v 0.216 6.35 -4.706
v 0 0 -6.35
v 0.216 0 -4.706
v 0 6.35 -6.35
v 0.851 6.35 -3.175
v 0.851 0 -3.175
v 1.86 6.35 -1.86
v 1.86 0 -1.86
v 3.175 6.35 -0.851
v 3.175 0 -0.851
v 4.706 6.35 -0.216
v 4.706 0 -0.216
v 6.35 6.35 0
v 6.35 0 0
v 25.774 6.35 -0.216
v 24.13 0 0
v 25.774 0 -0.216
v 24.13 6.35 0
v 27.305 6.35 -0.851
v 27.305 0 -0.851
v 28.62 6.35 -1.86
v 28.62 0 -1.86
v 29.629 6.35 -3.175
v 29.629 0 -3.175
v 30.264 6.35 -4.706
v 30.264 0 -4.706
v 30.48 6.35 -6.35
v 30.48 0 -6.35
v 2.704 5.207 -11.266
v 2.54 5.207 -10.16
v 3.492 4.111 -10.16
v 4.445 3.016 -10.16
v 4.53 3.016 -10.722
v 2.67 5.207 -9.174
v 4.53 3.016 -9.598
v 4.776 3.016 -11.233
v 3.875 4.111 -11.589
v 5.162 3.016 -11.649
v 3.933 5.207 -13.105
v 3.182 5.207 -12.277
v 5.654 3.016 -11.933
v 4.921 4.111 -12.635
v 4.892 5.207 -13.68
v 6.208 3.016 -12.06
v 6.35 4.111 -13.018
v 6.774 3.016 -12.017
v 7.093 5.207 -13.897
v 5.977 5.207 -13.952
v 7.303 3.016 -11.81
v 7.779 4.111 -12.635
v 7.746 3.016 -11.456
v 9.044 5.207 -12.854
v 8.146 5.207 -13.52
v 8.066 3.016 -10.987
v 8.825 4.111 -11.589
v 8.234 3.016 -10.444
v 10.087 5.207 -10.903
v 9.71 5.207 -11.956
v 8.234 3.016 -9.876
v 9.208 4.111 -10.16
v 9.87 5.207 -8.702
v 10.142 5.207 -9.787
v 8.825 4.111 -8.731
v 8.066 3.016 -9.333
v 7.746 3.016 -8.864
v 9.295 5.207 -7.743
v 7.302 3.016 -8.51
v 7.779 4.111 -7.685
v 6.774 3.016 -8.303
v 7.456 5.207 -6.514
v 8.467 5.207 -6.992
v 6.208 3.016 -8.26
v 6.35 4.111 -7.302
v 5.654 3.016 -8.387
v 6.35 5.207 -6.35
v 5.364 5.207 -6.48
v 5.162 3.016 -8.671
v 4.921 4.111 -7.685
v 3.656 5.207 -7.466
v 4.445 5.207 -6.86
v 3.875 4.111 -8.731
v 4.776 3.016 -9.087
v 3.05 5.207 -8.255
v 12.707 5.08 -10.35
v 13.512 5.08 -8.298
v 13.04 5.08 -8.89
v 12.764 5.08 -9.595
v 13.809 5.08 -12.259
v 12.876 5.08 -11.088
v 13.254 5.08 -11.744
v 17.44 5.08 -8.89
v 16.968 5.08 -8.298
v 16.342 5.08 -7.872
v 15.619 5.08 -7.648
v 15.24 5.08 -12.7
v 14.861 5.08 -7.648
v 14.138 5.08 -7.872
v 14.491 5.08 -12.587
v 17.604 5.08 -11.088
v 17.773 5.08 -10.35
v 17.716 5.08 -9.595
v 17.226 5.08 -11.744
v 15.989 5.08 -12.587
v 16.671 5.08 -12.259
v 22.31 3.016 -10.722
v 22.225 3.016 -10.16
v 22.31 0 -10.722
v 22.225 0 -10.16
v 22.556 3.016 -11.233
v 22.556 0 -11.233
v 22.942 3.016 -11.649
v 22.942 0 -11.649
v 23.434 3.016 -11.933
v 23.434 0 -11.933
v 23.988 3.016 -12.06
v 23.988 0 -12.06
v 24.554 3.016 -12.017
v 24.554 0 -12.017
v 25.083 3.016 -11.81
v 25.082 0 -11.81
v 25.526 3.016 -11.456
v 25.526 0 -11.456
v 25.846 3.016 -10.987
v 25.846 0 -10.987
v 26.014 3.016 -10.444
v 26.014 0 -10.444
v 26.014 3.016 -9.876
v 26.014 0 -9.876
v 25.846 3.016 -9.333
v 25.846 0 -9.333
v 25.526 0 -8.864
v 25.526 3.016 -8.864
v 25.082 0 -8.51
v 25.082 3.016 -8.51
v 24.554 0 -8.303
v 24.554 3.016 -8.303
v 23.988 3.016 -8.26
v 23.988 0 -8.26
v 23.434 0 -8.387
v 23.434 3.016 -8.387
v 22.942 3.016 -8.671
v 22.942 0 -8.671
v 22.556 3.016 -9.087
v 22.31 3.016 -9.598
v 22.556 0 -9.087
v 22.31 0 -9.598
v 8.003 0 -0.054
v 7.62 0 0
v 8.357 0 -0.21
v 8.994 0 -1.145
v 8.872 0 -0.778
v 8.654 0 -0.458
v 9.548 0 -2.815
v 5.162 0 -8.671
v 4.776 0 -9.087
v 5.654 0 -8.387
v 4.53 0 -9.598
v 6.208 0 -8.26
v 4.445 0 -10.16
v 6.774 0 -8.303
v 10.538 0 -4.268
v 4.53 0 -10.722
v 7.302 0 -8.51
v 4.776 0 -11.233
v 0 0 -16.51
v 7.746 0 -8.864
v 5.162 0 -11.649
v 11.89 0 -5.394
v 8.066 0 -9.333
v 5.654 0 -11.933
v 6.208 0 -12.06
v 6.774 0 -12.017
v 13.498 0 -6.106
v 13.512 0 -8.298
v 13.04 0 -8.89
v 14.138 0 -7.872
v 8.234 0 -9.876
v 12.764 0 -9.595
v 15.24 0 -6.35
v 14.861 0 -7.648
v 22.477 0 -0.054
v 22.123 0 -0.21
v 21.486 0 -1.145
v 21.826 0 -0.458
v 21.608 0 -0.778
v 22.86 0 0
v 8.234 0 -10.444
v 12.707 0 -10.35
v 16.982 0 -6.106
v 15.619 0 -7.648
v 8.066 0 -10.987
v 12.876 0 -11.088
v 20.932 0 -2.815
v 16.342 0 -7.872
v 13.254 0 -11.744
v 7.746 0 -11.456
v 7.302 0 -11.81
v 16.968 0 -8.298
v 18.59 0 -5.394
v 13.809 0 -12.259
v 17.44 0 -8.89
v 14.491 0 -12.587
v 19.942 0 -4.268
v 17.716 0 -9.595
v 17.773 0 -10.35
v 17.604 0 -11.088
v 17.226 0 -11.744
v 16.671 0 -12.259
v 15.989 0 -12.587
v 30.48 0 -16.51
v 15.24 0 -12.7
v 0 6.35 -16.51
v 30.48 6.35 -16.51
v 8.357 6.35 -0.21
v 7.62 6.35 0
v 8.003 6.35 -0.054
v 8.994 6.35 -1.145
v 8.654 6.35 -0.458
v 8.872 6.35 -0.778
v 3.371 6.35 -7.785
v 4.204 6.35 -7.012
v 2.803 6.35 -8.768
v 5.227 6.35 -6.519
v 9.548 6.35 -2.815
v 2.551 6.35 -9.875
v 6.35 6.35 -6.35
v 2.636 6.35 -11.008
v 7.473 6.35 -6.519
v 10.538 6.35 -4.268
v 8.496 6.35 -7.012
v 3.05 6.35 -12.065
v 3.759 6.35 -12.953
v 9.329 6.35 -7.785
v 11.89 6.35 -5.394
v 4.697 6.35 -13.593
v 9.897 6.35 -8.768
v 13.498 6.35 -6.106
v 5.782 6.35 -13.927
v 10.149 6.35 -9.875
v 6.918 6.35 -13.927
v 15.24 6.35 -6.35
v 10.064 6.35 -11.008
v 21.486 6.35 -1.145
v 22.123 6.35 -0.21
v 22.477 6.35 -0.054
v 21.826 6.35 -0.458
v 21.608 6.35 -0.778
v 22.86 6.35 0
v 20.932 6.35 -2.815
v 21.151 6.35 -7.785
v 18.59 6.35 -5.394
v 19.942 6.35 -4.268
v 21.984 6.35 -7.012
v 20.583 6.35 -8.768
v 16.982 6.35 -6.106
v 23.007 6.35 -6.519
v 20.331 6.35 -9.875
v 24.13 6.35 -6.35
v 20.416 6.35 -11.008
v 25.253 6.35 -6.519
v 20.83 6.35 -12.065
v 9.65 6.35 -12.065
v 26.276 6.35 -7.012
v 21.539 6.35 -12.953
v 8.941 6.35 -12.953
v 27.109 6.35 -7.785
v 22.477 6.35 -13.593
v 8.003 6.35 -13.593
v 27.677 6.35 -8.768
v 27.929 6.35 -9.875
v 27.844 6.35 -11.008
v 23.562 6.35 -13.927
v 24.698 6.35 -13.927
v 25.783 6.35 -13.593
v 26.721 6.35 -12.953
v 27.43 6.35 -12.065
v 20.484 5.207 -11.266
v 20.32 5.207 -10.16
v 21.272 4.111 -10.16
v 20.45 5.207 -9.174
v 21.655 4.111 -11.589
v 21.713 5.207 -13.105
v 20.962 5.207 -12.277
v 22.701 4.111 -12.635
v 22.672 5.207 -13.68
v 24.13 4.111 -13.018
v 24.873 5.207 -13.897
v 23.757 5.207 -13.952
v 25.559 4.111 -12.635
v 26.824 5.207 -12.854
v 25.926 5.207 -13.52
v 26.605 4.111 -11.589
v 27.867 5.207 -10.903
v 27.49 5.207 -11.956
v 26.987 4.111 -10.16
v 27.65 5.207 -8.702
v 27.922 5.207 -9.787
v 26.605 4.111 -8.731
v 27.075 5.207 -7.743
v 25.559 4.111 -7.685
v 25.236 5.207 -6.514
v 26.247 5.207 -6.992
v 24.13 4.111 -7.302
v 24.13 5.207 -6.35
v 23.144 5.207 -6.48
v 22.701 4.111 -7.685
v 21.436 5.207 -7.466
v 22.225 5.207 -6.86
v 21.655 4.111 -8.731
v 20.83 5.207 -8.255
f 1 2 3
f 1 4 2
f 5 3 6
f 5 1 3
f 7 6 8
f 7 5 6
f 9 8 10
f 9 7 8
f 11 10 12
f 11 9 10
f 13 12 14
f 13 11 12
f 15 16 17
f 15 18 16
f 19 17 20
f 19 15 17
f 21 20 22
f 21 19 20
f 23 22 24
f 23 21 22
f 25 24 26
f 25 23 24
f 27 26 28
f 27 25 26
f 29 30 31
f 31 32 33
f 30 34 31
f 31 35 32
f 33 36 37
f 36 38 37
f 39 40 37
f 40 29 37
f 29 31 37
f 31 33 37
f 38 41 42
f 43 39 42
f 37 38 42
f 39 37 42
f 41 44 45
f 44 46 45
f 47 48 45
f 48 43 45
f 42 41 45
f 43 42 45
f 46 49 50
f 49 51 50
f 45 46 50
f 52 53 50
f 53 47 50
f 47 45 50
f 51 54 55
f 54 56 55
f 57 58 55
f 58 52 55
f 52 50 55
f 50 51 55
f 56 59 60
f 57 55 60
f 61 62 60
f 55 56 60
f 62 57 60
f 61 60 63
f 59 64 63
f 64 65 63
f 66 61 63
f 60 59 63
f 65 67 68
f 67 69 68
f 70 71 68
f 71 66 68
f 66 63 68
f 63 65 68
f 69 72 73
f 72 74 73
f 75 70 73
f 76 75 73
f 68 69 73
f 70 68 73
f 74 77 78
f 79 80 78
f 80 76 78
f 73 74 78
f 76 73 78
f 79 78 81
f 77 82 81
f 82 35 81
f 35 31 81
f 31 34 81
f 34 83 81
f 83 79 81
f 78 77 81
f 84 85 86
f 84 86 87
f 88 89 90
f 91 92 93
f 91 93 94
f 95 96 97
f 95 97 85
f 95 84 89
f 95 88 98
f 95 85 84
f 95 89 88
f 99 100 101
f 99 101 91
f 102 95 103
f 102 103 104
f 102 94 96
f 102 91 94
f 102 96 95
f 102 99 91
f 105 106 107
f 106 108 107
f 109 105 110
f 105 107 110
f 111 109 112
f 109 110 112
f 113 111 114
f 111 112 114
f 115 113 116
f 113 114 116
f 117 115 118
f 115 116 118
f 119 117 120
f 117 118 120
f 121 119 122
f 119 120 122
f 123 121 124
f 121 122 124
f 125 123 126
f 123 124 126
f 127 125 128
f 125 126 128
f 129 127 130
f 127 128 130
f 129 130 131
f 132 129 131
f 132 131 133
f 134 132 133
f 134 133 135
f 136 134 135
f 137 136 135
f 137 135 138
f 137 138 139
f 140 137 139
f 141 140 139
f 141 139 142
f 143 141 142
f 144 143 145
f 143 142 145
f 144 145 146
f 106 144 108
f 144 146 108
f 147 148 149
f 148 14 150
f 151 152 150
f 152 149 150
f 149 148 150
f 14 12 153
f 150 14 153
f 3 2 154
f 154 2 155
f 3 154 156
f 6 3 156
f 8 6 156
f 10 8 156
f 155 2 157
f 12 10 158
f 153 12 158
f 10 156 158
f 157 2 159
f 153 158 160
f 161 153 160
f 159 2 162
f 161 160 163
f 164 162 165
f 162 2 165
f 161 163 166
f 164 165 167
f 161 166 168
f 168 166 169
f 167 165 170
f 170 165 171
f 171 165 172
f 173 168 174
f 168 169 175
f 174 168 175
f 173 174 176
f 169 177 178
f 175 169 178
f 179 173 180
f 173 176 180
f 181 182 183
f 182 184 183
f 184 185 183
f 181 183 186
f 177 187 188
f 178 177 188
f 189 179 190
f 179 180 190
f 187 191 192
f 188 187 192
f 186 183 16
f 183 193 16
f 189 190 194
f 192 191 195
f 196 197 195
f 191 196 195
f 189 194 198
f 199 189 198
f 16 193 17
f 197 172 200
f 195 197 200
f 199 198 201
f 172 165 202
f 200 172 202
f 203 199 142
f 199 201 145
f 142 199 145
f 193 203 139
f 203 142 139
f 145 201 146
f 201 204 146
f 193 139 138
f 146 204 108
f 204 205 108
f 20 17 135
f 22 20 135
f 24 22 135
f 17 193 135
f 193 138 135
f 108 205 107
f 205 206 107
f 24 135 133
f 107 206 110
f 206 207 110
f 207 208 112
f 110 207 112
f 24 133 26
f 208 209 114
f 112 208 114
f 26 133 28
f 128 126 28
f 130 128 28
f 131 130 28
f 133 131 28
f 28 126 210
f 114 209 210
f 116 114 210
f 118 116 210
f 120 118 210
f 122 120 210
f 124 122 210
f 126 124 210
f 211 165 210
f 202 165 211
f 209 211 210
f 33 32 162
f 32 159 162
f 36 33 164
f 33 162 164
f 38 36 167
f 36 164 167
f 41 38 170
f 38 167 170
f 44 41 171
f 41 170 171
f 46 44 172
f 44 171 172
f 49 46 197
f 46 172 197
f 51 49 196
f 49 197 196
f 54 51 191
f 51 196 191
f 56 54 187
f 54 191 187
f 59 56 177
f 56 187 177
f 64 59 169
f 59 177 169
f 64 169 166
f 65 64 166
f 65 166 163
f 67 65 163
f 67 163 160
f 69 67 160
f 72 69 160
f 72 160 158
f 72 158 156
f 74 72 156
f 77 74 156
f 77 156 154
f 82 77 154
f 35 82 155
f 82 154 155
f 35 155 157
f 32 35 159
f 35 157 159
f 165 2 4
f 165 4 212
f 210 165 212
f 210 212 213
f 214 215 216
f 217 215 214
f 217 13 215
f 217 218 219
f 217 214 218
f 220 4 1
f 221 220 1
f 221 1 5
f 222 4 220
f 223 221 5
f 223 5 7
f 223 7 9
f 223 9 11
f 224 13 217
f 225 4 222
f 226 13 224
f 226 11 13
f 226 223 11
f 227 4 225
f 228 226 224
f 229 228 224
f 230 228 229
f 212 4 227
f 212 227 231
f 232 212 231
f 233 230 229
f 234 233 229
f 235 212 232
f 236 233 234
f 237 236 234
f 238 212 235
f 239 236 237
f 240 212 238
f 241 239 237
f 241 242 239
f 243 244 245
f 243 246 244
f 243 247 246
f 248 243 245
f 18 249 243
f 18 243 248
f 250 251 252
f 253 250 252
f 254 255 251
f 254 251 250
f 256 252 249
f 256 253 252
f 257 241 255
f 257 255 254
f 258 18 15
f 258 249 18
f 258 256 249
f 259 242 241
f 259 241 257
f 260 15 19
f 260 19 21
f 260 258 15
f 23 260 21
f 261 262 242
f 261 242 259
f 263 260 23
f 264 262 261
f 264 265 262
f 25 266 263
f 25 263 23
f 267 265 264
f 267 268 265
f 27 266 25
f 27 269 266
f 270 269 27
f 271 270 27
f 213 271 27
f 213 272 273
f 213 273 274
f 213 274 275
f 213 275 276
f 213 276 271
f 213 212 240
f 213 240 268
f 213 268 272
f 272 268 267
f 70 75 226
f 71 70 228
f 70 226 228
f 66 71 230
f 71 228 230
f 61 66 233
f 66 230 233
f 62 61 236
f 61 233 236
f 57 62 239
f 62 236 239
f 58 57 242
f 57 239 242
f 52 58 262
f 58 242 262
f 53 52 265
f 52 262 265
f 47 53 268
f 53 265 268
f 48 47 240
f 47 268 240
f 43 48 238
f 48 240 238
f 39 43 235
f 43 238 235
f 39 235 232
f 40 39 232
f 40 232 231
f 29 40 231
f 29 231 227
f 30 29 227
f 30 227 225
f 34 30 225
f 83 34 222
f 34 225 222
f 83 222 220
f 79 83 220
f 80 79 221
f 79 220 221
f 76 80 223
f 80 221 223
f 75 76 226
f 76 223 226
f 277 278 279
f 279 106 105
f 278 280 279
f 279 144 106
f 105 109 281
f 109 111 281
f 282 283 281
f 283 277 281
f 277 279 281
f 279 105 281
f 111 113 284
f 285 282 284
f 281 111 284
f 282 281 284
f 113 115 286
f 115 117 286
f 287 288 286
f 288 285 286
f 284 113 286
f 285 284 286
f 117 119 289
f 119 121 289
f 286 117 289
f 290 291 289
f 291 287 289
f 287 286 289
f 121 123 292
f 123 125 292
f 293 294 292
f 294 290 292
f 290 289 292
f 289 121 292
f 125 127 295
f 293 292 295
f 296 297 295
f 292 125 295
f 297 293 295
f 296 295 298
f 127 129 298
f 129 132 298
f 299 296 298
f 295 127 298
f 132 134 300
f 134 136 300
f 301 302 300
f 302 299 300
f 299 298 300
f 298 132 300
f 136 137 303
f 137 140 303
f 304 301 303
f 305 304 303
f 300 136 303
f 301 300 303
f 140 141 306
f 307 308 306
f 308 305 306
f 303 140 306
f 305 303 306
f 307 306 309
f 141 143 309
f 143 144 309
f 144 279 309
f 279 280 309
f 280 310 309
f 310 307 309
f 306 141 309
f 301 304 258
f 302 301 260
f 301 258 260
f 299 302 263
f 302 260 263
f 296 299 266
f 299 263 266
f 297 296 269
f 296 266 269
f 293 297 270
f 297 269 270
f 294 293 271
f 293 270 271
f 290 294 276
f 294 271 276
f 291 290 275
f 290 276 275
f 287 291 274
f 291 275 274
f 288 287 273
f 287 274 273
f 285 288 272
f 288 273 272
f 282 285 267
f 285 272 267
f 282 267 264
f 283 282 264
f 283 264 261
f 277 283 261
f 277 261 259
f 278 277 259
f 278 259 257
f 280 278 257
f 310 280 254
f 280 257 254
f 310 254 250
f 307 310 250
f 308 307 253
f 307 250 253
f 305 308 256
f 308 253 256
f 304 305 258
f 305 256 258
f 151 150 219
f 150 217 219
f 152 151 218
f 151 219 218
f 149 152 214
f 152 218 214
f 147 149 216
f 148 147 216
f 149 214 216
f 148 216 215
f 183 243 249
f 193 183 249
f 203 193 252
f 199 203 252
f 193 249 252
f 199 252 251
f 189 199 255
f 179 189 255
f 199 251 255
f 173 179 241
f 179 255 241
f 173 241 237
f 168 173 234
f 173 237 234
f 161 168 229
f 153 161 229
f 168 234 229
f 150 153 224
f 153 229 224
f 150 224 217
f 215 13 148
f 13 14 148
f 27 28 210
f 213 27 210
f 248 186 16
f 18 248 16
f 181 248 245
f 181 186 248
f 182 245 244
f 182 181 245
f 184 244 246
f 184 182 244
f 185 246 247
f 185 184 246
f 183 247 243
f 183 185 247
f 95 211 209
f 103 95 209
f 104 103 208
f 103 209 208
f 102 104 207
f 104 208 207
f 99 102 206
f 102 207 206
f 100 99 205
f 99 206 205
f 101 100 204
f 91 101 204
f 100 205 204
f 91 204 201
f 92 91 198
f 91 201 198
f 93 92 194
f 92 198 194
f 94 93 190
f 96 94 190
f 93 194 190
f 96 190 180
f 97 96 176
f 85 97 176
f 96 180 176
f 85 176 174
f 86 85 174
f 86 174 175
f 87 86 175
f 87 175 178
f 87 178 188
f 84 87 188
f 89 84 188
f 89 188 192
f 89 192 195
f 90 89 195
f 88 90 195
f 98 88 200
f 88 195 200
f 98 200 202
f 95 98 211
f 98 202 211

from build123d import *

# Parameters (mm, degrees)
SKETCH1_W                                         = 30.48
SKETCH1_H                                         = 16.51
BOSS_EXTRUDE1_DEPTH                               = 6.35
FILLET1_R                                         = 6.35
SKETCH2_R                                         = 6.35
CUT_EXTRUDE1_DEPTH                                = 12.7
FILLET2_R                                         = 1.397
SKETCH3_R                                         = 3.81
CUT_EXTRUDE2_DEPTH                                = 1.143
CSK_FOR_0_FLAT_HEAD_SOCKET_CAP_SCREW1_D           = 3.81
CSK_FOR_0_FLAT_HEAD_SOCKET_CAP_SCREW1_CSINK_D     = 7.62
CSK_FOR_0_FLAT_HEAD_SOCKET_CAP_SCREW1_CSINK_ANGLE = 82
SKETCH6_R                                         = 2.54
CUT_EXTRUDE3_DEPTH                                = 5.08


with BuildPart() as part:
    # Sketch1 → Boss-Extrude1 (new body)
    with BuildSketch(Plane(origin=(0, 0, 0), x_dir=(1, 0, 0), z_dir=(0, 1, 0))):
        with Locations((15.24, 8.255)):
            Rectangle(SKETCH1_W, SKETCH1_H)
    extrude(amount=BOSS_EXTRUDE1_DEPTH)

    # Fillet1
    fillet1_edges = [part.edges().sort_by_distance(p)[0] for p in [
        (30.48, 3.175, 0),
        (0, 3.175, 0),
    ]]
    fillet(fillet1_edges, radius=FILLET1_R)

    # Sketch2 → Cut-Extrude1 (cut)
    with BuildSketch(Plane(origin=(0, 6.35, 0), x_dir=(1, 0, 0), z_dir=(0, 1, 0))):
        with Locations((15.24, 0)):
            Circle(SKETCH2_R)
    extrude(amount=-CUT_EXTRUDE1_DEPTH, mode=Mode.SUBTRACT)

    # Fillet2
    fillet2_edges = [part.edges().sort_by_distance(p)[0] for p in [
        (8.89, 3.175, 0),
        (21.59, 3.175, 0),
    ]]
    fillet(fillet2_edges, radius=FILLET2_R)

    # Sketch3 → Cut-Extrude2 (cut)
    with BuildSketch(Plane(origin=(0, 6.35, 0), x_dir=(1, 0, 0), z_dir=(0, 1, 0))):
        with Locations(Location((6.35, 10.16, 0), (0, 0, 270))):
            Circle(SKETCH3_R)
        with Locations(Location((24.13, 10.16, 0), (0, 0, 270))):
            Circle(SKETCH3_R)
    extrude(amount=-CUT_EXTRUDE2_DEPTH, mode=Mode.SUBTRACT)

    # CSK for #0 Flat Head Socket Cap Screw1 (through all)
    with Locations(Plane(origin=(0, 5.207, 0), x_dir=(1, 0, 0), z_dir=(0, 1, 0))):
        with Locations((6.35, 10.16), (24.13, 10.16)):
            CounterSinkHole(CSK_FOR_0_FLAT_HEAD_SOCKET_CAP_SCREW1_D / 2, CSK_FOR_0_FLAT_HEAD_SOCKET_CAP_SCREW1_CSINK_D / 2, counter_sink_angle=CSK_FOR_0_FLAT_HEAD_SOCKET_CAP_SCREW1_CSINK_ANGLE)

    # Sketch6 → Cut-Extrude3 (cut)
    with BuildSketch(Plane.XZ):
        with Locations(Location((15.24, -10.16, 0), (0, 0, 270))):
            Circle(SKETCH6_R)
    extrude(amount=-CUT_EXTRUDE3_DEPTH, mode=Mode.SUBTRACT)


solid = part.part
